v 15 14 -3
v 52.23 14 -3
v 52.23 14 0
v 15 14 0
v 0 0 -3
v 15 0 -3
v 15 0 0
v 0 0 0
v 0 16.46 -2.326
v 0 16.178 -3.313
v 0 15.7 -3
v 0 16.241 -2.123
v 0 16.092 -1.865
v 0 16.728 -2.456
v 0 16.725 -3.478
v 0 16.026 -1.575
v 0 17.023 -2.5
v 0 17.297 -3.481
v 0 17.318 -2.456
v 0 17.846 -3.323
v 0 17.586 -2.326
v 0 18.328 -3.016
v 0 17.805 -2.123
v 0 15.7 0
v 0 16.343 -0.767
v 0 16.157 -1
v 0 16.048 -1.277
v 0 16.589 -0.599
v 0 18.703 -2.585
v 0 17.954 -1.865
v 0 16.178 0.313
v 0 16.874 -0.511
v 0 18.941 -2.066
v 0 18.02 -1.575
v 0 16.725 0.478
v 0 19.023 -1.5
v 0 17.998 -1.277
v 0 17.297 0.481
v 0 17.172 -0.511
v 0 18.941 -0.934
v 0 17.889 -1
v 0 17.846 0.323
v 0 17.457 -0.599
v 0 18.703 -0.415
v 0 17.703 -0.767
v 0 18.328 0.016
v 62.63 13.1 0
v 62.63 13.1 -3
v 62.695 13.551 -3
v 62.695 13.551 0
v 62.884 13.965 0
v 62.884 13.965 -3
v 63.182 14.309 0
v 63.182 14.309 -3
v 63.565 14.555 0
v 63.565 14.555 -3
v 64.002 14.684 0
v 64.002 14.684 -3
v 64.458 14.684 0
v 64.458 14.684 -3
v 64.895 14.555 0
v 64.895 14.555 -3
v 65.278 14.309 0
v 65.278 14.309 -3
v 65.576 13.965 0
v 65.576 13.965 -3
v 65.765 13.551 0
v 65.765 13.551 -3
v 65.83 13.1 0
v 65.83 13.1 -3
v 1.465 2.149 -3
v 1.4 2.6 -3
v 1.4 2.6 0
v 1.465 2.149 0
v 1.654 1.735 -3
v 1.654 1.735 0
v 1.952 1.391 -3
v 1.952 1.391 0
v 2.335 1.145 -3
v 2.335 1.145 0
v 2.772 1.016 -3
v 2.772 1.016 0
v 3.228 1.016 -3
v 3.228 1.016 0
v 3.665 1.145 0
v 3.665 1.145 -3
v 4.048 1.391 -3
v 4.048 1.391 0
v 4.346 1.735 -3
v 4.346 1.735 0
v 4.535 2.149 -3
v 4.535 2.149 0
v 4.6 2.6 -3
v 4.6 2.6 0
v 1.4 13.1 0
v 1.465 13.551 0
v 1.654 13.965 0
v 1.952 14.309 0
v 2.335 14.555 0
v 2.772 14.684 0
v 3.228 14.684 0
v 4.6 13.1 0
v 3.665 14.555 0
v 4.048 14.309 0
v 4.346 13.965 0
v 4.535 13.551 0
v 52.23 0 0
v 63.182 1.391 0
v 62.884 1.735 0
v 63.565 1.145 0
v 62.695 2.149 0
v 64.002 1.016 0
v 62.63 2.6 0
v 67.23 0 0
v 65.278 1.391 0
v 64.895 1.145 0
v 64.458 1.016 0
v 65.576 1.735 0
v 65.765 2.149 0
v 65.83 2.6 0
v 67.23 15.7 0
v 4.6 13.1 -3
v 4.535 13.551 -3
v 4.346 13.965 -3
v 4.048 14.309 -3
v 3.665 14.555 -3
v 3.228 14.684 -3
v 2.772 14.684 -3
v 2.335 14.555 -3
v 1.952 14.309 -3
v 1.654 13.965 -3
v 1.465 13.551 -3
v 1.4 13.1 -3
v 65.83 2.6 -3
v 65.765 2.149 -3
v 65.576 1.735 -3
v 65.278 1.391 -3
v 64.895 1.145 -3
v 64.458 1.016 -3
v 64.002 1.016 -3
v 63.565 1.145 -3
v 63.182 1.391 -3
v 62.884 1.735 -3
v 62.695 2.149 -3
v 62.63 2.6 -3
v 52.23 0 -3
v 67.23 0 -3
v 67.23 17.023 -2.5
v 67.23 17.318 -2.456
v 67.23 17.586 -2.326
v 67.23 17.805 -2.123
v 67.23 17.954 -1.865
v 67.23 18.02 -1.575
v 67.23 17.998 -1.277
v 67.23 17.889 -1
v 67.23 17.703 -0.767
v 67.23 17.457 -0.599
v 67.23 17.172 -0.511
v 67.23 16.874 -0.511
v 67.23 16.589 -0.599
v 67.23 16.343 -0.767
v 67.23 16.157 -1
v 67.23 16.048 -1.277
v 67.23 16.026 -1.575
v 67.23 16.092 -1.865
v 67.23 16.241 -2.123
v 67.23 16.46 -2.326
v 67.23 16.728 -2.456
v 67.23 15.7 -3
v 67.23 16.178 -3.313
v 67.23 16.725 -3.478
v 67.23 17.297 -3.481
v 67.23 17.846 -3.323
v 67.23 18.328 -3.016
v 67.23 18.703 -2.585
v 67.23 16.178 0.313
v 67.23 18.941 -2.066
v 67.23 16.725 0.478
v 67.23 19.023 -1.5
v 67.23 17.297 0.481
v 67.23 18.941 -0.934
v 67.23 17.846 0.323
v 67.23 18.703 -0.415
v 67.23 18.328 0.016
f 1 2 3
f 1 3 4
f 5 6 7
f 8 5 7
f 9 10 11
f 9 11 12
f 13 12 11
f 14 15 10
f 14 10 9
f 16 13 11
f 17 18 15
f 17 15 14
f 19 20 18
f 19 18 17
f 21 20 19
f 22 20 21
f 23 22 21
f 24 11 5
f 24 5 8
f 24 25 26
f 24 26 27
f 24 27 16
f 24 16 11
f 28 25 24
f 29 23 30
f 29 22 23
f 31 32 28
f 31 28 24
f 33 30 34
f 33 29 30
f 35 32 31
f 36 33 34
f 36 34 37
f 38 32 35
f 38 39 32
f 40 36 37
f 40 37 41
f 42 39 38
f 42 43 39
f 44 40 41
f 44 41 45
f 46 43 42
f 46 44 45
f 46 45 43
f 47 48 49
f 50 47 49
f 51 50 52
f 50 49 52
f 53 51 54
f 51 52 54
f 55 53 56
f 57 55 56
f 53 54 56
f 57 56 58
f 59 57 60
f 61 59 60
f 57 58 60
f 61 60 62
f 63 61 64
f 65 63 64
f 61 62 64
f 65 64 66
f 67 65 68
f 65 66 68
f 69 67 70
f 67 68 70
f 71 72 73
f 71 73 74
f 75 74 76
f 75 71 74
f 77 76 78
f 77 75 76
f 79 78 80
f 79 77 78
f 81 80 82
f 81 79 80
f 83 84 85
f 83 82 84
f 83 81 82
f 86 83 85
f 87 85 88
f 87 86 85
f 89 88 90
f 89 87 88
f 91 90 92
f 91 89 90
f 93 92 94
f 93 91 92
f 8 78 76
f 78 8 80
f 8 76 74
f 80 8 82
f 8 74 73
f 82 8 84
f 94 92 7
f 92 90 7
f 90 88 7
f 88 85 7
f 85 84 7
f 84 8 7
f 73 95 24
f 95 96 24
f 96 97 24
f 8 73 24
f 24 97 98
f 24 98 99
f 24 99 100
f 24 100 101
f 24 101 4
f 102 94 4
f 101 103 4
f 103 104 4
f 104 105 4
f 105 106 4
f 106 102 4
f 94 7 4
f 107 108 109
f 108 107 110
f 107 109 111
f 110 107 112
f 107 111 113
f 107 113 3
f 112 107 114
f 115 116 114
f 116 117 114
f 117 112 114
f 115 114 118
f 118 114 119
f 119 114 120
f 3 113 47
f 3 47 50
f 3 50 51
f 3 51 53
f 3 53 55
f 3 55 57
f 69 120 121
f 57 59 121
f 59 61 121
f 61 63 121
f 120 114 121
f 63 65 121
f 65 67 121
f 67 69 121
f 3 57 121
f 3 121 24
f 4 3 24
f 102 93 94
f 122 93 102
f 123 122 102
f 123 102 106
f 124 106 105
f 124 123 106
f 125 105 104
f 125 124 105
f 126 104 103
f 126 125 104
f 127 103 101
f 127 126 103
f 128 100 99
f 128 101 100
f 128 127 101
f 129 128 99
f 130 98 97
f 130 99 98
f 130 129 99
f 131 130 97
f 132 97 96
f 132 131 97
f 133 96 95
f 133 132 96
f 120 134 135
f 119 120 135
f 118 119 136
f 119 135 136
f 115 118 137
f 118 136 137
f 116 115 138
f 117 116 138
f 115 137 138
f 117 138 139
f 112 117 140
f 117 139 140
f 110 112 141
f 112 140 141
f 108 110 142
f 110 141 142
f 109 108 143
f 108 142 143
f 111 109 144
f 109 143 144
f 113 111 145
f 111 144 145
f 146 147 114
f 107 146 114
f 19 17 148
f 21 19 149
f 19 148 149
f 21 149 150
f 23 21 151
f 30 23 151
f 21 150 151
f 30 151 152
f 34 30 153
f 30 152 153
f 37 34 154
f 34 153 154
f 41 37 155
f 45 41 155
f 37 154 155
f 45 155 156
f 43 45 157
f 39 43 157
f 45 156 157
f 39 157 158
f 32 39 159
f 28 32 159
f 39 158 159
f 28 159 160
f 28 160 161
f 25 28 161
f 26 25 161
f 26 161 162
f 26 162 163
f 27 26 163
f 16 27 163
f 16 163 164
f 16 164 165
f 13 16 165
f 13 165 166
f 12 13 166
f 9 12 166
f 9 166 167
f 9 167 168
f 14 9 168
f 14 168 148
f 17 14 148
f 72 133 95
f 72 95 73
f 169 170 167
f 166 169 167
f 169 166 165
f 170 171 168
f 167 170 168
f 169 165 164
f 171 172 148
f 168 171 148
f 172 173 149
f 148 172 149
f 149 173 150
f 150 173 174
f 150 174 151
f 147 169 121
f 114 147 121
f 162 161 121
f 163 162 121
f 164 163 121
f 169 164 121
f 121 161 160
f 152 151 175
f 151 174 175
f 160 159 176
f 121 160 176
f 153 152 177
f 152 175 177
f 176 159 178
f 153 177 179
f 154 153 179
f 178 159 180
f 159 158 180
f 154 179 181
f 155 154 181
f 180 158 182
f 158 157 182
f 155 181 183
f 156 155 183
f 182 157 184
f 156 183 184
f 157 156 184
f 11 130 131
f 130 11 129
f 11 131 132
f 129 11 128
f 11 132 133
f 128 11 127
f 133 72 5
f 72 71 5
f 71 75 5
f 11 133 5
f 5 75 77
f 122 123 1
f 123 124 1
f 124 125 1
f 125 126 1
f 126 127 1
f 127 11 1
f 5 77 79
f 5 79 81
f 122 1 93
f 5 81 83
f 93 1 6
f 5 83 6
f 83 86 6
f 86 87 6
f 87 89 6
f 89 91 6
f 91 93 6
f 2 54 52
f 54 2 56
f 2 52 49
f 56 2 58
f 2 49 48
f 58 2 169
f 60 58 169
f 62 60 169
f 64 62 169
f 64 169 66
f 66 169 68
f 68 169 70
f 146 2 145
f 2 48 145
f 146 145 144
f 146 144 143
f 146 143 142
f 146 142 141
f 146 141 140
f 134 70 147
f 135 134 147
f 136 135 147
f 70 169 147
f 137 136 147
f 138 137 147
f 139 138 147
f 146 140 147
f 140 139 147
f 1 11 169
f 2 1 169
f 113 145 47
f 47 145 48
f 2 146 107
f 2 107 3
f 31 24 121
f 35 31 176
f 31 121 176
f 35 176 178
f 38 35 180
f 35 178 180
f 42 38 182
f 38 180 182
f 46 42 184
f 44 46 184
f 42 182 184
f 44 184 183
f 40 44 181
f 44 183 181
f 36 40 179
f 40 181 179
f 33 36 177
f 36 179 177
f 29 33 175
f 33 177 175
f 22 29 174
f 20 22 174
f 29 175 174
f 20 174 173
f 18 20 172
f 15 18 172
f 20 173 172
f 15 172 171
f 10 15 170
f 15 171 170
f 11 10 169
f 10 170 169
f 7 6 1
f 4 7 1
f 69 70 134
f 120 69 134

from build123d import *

# Parameters (mm, degrees)
SKETCH1_R           = 1
BOSS_EXTRUDE1_DEPTH = 33.615
CUT_EXTRUDE1_DEPTH  = 39.782573705
SKETCH3_W           = 37.23
SKETCH3_H           = 14
CUT_EXTRUDE3_DEPTH  = 10


with BuildPart() as part:
    # Sketch1 → Boss-Extrude1 (new body)
    with BuildSketch(Plane(origin=(0, 0, 0), x_dir=(0, 0, -1), z_dir=(1, 0, 0))):
        with BuildLine():
            ThreePointArc((0, 15.7), (1.5, 19.022875656), (3, 15.7))
            Line((3, 15.7), (3, 0))
            Line((3, 0), (0, 0))
            Line((0, 0), (0, 15.7))
        make_face()
        with Locations((1.5, 17.022875656)):
            Circle(SKETCH1_R, mode=Mode.SUBTRACT)
    boss_extrude1 = extrude(amount=BOSS_EXTRUDE1_DEPTH)

    # Sketch2 → Cut-Extrude1 (cut, through all)
    with BuildSketch(Plane(origin=(0, 0, -3), x_dir=(-1, 0, 0), z_dir=(0, 0, -1))):
        with BuildLine():
            Line((-1.4, 13.1), (-1.4, 2.6))
            ThreePointArc((-1.4, 2.6), (-3, 1), (-4.6, 2.6))
            Line((-4.6, 2.6), (-4.6, 13.1))
            ThreePointArc((-4.6, 13.1), (-3, 14.7), (-1.4, 13.1))
        make_face()
    cut_extrude1 = extrude(amount=-CUT_EXTRUDE1_DEPTH, mode=Mode.SUBTRACT)

    # Mirror1: Boss-Extrude1, Cut-Extrude1 across plane
    add(boss_extrude1.mirror(Plane(origin=(33.615, 0, 0), x_dir=(0, 0, 1), z_dir=(1, 0, 0))))
    add(cut_extrude1.mirror(Plane(origin=(33.615, 0, 0), x_dir=(0, 0, 1), z_dir=(1, 0, 0))), mode=Mode.SUBTRACT)

    # Sketch3 → Cut-Extrude3 (cut)
    with BuildSketch(Plane(origin=(0, 0, -3), x_dir=(-1, 0, 0), z_dir=(0, 0, -1))):
        with Locations((-33.615, 7)):
            Rectangle(SKETCH3_W, SKETCH3_H)
    extrude(amount=-CUT_EXTRUDE3_DEPTH, mode=Mode.SUBTRACT)


solid = part.part
